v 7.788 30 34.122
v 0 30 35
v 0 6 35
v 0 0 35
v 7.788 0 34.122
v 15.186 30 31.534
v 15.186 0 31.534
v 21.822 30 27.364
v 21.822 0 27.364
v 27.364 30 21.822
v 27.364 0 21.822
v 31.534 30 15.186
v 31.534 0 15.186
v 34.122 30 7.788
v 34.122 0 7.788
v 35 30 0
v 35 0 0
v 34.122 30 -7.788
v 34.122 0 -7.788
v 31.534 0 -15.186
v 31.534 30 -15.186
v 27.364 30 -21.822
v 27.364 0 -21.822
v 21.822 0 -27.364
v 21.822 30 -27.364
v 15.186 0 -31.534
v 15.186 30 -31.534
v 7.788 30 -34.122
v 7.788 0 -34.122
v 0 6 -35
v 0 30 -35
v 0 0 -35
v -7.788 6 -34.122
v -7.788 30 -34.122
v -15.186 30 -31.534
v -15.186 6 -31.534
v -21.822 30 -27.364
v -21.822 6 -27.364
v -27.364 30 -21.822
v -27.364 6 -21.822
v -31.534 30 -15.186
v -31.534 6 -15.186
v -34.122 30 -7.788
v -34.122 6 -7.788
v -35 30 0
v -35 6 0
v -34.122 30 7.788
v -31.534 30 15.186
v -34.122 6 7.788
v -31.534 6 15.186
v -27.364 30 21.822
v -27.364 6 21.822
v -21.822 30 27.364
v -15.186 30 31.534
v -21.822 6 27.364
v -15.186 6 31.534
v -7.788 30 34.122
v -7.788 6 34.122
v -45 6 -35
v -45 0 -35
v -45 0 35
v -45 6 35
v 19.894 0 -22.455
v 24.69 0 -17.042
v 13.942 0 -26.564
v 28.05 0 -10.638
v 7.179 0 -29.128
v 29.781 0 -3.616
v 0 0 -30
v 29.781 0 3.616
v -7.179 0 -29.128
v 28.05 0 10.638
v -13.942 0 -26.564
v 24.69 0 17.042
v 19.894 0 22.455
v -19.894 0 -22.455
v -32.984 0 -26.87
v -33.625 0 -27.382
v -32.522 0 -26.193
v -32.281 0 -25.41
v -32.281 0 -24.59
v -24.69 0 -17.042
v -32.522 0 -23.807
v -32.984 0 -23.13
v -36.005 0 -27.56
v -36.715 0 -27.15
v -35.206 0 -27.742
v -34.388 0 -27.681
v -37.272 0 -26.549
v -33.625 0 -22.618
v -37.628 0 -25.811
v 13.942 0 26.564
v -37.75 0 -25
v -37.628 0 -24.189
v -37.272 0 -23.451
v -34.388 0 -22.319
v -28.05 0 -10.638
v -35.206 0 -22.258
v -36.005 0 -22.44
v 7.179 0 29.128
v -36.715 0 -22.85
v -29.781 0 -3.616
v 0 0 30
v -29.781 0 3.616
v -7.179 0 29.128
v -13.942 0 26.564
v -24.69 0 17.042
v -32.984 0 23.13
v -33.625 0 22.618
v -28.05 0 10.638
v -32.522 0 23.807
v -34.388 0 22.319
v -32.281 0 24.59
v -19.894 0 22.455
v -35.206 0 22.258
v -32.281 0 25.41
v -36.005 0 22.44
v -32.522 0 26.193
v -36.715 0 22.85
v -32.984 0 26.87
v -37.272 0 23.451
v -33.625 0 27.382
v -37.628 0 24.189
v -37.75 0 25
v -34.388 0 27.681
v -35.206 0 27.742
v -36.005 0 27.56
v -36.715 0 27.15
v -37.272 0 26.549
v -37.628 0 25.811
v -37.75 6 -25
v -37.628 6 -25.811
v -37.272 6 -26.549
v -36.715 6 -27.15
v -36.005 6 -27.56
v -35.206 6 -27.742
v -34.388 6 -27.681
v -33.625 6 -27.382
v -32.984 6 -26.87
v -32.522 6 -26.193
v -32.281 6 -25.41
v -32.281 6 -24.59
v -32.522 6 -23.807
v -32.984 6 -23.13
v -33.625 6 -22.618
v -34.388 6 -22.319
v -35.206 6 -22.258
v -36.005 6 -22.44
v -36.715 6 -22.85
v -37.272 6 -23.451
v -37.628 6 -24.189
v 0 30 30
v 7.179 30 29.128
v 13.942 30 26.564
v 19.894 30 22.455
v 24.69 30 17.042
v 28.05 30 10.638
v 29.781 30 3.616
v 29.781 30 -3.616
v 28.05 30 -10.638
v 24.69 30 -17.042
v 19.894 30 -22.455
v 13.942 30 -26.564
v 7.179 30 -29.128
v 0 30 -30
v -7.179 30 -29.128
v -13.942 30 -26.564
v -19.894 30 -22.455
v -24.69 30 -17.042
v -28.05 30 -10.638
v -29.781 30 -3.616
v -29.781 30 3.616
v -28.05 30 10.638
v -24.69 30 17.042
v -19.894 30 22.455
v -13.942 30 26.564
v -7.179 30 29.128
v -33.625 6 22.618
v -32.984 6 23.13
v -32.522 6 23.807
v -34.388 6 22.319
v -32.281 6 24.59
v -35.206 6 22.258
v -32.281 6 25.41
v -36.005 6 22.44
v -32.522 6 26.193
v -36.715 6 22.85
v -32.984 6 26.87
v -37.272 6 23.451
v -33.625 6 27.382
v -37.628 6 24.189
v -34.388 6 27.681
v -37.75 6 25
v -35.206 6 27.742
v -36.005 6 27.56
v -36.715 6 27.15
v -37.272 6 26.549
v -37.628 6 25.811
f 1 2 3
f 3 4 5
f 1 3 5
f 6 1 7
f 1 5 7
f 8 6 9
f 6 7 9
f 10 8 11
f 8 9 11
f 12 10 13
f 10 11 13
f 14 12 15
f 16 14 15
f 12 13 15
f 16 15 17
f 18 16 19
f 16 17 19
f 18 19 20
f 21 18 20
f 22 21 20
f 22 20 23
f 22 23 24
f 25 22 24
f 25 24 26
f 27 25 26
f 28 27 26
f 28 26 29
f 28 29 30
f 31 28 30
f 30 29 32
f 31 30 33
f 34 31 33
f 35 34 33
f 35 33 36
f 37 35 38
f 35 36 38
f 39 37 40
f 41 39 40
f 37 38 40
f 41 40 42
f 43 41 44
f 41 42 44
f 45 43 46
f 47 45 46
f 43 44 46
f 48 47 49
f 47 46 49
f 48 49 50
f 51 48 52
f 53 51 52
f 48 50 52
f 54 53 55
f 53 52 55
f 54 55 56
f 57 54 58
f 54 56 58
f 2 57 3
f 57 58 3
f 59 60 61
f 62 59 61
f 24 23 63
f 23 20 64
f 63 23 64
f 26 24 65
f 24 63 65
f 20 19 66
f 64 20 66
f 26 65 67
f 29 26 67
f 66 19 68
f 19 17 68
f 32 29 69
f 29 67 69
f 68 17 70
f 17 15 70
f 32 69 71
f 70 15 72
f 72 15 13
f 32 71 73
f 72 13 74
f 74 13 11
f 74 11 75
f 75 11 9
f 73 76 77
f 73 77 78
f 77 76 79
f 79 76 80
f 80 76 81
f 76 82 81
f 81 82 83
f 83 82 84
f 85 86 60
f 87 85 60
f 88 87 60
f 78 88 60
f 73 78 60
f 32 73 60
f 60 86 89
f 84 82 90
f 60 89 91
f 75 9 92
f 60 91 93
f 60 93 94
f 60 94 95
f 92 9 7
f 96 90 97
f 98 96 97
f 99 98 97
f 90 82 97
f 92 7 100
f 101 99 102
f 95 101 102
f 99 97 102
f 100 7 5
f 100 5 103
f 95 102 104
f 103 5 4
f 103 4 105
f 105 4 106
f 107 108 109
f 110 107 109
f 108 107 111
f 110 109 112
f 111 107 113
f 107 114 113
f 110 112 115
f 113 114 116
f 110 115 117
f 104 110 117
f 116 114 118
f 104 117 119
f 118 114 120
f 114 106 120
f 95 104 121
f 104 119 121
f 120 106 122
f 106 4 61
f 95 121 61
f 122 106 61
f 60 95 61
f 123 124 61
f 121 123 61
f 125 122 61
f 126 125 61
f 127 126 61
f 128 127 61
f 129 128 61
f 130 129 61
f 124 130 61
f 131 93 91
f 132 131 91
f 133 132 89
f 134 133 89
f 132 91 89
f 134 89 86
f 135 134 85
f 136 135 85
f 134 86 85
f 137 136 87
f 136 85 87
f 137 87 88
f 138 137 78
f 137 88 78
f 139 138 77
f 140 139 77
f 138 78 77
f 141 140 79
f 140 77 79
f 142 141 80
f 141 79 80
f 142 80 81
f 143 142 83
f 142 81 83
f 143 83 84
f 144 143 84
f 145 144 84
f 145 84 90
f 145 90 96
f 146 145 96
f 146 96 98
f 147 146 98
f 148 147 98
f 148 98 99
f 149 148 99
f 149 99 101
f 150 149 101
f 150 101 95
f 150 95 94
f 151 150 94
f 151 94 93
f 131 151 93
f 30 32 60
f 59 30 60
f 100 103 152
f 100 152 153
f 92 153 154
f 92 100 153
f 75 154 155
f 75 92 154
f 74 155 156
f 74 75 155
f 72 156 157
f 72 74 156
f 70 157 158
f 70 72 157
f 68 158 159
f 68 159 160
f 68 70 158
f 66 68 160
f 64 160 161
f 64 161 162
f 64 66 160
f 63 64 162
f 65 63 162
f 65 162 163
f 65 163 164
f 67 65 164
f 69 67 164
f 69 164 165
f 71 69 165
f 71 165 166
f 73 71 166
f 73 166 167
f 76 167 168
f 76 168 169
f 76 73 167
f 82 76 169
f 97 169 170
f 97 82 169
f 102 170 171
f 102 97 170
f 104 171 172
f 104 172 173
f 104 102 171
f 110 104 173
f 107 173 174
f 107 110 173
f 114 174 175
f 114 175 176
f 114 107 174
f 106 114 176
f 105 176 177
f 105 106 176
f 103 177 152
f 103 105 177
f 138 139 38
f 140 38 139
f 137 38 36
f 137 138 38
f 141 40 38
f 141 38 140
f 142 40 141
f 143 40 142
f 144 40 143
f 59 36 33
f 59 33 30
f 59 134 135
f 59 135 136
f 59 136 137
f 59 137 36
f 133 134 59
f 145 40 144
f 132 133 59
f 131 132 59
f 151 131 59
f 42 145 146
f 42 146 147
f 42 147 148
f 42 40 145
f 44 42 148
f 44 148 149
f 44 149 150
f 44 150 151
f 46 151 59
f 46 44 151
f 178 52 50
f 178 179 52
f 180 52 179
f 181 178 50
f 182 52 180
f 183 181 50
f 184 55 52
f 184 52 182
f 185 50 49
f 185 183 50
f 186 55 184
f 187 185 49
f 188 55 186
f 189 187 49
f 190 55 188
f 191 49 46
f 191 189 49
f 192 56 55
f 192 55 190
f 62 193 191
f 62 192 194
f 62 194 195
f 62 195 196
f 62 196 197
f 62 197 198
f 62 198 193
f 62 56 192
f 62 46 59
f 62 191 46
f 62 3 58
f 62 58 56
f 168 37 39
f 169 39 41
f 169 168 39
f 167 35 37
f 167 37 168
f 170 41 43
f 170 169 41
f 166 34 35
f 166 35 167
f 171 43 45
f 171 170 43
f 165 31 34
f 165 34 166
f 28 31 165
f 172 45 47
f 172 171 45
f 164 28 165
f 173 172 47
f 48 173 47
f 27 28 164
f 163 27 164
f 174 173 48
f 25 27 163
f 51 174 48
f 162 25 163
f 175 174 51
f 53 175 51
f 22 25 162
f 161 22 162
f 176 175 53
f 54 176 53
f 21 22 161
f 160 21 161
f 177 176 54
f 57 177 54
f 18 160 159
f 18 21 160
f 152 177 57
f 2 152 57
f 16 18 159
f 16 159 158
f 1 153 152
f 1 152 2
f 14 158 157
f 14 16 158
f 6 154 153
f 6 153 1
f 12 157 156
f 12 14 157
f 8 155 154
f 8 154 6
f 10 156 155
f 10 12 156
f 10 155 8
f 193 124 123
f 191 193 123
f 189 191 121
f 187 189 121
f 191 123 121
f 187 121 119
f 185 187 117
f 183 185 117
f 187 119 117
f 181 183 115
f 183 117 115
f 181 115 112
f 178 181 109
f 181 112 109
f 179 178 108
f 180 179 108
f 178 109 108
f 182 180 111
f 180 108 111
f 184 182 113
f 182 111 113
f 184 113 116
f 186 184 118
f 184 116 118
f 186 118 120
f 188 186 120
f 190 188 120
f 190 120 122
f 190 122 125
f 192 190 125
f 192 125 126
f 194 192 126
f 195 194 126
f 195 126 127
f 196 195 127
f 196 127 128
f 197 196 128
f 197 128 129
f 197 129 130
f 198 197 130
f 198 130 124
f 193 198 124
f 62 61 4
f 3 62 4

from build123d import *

# Parameters (mm, degrees)
SKETCH1_R                = 35
SKETCH1_R_2              = 30
BOSS_EXTRUDE1_DEPTH      = 30
BOSS_EXTRUDE2_DEPTH      = 6
M5_CLEARANCE_HOLE1_D     = 5.5
M5_CLEARANCE_HOLE1_DEPTH = 10
M5_CLEARANCE_HOLE1_TIP   = 1.652366702


with BuildPart() as part:
    # Sketch1 → Boss-Extrude1 (new body)
    with BuildSketch(Plane(origin=(0, 0, 0), x_dir=(1, 0, 0), z_dir=(0, 1, 0))):
        with Locations(Location((0, 0, 0), (0, 0, 270))):
            Circle(SKETCH1_R)
        with Locations(Location((0, 0, 0), (0, 0, 270))):
            Circle(SKETCH1_R_2, mode=Mode.SUBTRACT)
    extrude(amount=BOSS_EXTRUDE1_DEPTH)

    # Sketch2 → Boss-Extrude2 (add)
    with BuildSketch(Plane.XZ):
        with BuildLine():
            Line((0, -35), (-45, -35))
            Line((-45, -35), (-45, 35))
            Line((-45, 35), (0, 35))
            ThreePointArc((0, 35), (-35, 0), (0, -35))
        make_face()
    extrude(amount=-BOSS_EXTRUDE2_DEPTH)

    # M5 Clearance Hole1
    with Locations(Plane(origin=(0, 6, 0), x_dir=(1, 0, 0), z_dir=(0, 1, 0))):
        with Locations((-35, 25), (-35, -25)):
            Hole(M5_CLEARANCE_HOLE1_D / 2, depth=M5_CLEARANCE_HOLE1_DEPTH)
            with Locations((0, 0, -(M5_CLEARANCE_HOLE1_DEPTH + M5_CLEARANCE_HOLE1_TIP / 2))):  # 118° drill point
                Cone(0, M5_CLEARANCE_HOLE1_D / 2, M5_CLEARANCE_HOLE1_TIP, mode=Mode.SUBTRACT)


solid = part.part
